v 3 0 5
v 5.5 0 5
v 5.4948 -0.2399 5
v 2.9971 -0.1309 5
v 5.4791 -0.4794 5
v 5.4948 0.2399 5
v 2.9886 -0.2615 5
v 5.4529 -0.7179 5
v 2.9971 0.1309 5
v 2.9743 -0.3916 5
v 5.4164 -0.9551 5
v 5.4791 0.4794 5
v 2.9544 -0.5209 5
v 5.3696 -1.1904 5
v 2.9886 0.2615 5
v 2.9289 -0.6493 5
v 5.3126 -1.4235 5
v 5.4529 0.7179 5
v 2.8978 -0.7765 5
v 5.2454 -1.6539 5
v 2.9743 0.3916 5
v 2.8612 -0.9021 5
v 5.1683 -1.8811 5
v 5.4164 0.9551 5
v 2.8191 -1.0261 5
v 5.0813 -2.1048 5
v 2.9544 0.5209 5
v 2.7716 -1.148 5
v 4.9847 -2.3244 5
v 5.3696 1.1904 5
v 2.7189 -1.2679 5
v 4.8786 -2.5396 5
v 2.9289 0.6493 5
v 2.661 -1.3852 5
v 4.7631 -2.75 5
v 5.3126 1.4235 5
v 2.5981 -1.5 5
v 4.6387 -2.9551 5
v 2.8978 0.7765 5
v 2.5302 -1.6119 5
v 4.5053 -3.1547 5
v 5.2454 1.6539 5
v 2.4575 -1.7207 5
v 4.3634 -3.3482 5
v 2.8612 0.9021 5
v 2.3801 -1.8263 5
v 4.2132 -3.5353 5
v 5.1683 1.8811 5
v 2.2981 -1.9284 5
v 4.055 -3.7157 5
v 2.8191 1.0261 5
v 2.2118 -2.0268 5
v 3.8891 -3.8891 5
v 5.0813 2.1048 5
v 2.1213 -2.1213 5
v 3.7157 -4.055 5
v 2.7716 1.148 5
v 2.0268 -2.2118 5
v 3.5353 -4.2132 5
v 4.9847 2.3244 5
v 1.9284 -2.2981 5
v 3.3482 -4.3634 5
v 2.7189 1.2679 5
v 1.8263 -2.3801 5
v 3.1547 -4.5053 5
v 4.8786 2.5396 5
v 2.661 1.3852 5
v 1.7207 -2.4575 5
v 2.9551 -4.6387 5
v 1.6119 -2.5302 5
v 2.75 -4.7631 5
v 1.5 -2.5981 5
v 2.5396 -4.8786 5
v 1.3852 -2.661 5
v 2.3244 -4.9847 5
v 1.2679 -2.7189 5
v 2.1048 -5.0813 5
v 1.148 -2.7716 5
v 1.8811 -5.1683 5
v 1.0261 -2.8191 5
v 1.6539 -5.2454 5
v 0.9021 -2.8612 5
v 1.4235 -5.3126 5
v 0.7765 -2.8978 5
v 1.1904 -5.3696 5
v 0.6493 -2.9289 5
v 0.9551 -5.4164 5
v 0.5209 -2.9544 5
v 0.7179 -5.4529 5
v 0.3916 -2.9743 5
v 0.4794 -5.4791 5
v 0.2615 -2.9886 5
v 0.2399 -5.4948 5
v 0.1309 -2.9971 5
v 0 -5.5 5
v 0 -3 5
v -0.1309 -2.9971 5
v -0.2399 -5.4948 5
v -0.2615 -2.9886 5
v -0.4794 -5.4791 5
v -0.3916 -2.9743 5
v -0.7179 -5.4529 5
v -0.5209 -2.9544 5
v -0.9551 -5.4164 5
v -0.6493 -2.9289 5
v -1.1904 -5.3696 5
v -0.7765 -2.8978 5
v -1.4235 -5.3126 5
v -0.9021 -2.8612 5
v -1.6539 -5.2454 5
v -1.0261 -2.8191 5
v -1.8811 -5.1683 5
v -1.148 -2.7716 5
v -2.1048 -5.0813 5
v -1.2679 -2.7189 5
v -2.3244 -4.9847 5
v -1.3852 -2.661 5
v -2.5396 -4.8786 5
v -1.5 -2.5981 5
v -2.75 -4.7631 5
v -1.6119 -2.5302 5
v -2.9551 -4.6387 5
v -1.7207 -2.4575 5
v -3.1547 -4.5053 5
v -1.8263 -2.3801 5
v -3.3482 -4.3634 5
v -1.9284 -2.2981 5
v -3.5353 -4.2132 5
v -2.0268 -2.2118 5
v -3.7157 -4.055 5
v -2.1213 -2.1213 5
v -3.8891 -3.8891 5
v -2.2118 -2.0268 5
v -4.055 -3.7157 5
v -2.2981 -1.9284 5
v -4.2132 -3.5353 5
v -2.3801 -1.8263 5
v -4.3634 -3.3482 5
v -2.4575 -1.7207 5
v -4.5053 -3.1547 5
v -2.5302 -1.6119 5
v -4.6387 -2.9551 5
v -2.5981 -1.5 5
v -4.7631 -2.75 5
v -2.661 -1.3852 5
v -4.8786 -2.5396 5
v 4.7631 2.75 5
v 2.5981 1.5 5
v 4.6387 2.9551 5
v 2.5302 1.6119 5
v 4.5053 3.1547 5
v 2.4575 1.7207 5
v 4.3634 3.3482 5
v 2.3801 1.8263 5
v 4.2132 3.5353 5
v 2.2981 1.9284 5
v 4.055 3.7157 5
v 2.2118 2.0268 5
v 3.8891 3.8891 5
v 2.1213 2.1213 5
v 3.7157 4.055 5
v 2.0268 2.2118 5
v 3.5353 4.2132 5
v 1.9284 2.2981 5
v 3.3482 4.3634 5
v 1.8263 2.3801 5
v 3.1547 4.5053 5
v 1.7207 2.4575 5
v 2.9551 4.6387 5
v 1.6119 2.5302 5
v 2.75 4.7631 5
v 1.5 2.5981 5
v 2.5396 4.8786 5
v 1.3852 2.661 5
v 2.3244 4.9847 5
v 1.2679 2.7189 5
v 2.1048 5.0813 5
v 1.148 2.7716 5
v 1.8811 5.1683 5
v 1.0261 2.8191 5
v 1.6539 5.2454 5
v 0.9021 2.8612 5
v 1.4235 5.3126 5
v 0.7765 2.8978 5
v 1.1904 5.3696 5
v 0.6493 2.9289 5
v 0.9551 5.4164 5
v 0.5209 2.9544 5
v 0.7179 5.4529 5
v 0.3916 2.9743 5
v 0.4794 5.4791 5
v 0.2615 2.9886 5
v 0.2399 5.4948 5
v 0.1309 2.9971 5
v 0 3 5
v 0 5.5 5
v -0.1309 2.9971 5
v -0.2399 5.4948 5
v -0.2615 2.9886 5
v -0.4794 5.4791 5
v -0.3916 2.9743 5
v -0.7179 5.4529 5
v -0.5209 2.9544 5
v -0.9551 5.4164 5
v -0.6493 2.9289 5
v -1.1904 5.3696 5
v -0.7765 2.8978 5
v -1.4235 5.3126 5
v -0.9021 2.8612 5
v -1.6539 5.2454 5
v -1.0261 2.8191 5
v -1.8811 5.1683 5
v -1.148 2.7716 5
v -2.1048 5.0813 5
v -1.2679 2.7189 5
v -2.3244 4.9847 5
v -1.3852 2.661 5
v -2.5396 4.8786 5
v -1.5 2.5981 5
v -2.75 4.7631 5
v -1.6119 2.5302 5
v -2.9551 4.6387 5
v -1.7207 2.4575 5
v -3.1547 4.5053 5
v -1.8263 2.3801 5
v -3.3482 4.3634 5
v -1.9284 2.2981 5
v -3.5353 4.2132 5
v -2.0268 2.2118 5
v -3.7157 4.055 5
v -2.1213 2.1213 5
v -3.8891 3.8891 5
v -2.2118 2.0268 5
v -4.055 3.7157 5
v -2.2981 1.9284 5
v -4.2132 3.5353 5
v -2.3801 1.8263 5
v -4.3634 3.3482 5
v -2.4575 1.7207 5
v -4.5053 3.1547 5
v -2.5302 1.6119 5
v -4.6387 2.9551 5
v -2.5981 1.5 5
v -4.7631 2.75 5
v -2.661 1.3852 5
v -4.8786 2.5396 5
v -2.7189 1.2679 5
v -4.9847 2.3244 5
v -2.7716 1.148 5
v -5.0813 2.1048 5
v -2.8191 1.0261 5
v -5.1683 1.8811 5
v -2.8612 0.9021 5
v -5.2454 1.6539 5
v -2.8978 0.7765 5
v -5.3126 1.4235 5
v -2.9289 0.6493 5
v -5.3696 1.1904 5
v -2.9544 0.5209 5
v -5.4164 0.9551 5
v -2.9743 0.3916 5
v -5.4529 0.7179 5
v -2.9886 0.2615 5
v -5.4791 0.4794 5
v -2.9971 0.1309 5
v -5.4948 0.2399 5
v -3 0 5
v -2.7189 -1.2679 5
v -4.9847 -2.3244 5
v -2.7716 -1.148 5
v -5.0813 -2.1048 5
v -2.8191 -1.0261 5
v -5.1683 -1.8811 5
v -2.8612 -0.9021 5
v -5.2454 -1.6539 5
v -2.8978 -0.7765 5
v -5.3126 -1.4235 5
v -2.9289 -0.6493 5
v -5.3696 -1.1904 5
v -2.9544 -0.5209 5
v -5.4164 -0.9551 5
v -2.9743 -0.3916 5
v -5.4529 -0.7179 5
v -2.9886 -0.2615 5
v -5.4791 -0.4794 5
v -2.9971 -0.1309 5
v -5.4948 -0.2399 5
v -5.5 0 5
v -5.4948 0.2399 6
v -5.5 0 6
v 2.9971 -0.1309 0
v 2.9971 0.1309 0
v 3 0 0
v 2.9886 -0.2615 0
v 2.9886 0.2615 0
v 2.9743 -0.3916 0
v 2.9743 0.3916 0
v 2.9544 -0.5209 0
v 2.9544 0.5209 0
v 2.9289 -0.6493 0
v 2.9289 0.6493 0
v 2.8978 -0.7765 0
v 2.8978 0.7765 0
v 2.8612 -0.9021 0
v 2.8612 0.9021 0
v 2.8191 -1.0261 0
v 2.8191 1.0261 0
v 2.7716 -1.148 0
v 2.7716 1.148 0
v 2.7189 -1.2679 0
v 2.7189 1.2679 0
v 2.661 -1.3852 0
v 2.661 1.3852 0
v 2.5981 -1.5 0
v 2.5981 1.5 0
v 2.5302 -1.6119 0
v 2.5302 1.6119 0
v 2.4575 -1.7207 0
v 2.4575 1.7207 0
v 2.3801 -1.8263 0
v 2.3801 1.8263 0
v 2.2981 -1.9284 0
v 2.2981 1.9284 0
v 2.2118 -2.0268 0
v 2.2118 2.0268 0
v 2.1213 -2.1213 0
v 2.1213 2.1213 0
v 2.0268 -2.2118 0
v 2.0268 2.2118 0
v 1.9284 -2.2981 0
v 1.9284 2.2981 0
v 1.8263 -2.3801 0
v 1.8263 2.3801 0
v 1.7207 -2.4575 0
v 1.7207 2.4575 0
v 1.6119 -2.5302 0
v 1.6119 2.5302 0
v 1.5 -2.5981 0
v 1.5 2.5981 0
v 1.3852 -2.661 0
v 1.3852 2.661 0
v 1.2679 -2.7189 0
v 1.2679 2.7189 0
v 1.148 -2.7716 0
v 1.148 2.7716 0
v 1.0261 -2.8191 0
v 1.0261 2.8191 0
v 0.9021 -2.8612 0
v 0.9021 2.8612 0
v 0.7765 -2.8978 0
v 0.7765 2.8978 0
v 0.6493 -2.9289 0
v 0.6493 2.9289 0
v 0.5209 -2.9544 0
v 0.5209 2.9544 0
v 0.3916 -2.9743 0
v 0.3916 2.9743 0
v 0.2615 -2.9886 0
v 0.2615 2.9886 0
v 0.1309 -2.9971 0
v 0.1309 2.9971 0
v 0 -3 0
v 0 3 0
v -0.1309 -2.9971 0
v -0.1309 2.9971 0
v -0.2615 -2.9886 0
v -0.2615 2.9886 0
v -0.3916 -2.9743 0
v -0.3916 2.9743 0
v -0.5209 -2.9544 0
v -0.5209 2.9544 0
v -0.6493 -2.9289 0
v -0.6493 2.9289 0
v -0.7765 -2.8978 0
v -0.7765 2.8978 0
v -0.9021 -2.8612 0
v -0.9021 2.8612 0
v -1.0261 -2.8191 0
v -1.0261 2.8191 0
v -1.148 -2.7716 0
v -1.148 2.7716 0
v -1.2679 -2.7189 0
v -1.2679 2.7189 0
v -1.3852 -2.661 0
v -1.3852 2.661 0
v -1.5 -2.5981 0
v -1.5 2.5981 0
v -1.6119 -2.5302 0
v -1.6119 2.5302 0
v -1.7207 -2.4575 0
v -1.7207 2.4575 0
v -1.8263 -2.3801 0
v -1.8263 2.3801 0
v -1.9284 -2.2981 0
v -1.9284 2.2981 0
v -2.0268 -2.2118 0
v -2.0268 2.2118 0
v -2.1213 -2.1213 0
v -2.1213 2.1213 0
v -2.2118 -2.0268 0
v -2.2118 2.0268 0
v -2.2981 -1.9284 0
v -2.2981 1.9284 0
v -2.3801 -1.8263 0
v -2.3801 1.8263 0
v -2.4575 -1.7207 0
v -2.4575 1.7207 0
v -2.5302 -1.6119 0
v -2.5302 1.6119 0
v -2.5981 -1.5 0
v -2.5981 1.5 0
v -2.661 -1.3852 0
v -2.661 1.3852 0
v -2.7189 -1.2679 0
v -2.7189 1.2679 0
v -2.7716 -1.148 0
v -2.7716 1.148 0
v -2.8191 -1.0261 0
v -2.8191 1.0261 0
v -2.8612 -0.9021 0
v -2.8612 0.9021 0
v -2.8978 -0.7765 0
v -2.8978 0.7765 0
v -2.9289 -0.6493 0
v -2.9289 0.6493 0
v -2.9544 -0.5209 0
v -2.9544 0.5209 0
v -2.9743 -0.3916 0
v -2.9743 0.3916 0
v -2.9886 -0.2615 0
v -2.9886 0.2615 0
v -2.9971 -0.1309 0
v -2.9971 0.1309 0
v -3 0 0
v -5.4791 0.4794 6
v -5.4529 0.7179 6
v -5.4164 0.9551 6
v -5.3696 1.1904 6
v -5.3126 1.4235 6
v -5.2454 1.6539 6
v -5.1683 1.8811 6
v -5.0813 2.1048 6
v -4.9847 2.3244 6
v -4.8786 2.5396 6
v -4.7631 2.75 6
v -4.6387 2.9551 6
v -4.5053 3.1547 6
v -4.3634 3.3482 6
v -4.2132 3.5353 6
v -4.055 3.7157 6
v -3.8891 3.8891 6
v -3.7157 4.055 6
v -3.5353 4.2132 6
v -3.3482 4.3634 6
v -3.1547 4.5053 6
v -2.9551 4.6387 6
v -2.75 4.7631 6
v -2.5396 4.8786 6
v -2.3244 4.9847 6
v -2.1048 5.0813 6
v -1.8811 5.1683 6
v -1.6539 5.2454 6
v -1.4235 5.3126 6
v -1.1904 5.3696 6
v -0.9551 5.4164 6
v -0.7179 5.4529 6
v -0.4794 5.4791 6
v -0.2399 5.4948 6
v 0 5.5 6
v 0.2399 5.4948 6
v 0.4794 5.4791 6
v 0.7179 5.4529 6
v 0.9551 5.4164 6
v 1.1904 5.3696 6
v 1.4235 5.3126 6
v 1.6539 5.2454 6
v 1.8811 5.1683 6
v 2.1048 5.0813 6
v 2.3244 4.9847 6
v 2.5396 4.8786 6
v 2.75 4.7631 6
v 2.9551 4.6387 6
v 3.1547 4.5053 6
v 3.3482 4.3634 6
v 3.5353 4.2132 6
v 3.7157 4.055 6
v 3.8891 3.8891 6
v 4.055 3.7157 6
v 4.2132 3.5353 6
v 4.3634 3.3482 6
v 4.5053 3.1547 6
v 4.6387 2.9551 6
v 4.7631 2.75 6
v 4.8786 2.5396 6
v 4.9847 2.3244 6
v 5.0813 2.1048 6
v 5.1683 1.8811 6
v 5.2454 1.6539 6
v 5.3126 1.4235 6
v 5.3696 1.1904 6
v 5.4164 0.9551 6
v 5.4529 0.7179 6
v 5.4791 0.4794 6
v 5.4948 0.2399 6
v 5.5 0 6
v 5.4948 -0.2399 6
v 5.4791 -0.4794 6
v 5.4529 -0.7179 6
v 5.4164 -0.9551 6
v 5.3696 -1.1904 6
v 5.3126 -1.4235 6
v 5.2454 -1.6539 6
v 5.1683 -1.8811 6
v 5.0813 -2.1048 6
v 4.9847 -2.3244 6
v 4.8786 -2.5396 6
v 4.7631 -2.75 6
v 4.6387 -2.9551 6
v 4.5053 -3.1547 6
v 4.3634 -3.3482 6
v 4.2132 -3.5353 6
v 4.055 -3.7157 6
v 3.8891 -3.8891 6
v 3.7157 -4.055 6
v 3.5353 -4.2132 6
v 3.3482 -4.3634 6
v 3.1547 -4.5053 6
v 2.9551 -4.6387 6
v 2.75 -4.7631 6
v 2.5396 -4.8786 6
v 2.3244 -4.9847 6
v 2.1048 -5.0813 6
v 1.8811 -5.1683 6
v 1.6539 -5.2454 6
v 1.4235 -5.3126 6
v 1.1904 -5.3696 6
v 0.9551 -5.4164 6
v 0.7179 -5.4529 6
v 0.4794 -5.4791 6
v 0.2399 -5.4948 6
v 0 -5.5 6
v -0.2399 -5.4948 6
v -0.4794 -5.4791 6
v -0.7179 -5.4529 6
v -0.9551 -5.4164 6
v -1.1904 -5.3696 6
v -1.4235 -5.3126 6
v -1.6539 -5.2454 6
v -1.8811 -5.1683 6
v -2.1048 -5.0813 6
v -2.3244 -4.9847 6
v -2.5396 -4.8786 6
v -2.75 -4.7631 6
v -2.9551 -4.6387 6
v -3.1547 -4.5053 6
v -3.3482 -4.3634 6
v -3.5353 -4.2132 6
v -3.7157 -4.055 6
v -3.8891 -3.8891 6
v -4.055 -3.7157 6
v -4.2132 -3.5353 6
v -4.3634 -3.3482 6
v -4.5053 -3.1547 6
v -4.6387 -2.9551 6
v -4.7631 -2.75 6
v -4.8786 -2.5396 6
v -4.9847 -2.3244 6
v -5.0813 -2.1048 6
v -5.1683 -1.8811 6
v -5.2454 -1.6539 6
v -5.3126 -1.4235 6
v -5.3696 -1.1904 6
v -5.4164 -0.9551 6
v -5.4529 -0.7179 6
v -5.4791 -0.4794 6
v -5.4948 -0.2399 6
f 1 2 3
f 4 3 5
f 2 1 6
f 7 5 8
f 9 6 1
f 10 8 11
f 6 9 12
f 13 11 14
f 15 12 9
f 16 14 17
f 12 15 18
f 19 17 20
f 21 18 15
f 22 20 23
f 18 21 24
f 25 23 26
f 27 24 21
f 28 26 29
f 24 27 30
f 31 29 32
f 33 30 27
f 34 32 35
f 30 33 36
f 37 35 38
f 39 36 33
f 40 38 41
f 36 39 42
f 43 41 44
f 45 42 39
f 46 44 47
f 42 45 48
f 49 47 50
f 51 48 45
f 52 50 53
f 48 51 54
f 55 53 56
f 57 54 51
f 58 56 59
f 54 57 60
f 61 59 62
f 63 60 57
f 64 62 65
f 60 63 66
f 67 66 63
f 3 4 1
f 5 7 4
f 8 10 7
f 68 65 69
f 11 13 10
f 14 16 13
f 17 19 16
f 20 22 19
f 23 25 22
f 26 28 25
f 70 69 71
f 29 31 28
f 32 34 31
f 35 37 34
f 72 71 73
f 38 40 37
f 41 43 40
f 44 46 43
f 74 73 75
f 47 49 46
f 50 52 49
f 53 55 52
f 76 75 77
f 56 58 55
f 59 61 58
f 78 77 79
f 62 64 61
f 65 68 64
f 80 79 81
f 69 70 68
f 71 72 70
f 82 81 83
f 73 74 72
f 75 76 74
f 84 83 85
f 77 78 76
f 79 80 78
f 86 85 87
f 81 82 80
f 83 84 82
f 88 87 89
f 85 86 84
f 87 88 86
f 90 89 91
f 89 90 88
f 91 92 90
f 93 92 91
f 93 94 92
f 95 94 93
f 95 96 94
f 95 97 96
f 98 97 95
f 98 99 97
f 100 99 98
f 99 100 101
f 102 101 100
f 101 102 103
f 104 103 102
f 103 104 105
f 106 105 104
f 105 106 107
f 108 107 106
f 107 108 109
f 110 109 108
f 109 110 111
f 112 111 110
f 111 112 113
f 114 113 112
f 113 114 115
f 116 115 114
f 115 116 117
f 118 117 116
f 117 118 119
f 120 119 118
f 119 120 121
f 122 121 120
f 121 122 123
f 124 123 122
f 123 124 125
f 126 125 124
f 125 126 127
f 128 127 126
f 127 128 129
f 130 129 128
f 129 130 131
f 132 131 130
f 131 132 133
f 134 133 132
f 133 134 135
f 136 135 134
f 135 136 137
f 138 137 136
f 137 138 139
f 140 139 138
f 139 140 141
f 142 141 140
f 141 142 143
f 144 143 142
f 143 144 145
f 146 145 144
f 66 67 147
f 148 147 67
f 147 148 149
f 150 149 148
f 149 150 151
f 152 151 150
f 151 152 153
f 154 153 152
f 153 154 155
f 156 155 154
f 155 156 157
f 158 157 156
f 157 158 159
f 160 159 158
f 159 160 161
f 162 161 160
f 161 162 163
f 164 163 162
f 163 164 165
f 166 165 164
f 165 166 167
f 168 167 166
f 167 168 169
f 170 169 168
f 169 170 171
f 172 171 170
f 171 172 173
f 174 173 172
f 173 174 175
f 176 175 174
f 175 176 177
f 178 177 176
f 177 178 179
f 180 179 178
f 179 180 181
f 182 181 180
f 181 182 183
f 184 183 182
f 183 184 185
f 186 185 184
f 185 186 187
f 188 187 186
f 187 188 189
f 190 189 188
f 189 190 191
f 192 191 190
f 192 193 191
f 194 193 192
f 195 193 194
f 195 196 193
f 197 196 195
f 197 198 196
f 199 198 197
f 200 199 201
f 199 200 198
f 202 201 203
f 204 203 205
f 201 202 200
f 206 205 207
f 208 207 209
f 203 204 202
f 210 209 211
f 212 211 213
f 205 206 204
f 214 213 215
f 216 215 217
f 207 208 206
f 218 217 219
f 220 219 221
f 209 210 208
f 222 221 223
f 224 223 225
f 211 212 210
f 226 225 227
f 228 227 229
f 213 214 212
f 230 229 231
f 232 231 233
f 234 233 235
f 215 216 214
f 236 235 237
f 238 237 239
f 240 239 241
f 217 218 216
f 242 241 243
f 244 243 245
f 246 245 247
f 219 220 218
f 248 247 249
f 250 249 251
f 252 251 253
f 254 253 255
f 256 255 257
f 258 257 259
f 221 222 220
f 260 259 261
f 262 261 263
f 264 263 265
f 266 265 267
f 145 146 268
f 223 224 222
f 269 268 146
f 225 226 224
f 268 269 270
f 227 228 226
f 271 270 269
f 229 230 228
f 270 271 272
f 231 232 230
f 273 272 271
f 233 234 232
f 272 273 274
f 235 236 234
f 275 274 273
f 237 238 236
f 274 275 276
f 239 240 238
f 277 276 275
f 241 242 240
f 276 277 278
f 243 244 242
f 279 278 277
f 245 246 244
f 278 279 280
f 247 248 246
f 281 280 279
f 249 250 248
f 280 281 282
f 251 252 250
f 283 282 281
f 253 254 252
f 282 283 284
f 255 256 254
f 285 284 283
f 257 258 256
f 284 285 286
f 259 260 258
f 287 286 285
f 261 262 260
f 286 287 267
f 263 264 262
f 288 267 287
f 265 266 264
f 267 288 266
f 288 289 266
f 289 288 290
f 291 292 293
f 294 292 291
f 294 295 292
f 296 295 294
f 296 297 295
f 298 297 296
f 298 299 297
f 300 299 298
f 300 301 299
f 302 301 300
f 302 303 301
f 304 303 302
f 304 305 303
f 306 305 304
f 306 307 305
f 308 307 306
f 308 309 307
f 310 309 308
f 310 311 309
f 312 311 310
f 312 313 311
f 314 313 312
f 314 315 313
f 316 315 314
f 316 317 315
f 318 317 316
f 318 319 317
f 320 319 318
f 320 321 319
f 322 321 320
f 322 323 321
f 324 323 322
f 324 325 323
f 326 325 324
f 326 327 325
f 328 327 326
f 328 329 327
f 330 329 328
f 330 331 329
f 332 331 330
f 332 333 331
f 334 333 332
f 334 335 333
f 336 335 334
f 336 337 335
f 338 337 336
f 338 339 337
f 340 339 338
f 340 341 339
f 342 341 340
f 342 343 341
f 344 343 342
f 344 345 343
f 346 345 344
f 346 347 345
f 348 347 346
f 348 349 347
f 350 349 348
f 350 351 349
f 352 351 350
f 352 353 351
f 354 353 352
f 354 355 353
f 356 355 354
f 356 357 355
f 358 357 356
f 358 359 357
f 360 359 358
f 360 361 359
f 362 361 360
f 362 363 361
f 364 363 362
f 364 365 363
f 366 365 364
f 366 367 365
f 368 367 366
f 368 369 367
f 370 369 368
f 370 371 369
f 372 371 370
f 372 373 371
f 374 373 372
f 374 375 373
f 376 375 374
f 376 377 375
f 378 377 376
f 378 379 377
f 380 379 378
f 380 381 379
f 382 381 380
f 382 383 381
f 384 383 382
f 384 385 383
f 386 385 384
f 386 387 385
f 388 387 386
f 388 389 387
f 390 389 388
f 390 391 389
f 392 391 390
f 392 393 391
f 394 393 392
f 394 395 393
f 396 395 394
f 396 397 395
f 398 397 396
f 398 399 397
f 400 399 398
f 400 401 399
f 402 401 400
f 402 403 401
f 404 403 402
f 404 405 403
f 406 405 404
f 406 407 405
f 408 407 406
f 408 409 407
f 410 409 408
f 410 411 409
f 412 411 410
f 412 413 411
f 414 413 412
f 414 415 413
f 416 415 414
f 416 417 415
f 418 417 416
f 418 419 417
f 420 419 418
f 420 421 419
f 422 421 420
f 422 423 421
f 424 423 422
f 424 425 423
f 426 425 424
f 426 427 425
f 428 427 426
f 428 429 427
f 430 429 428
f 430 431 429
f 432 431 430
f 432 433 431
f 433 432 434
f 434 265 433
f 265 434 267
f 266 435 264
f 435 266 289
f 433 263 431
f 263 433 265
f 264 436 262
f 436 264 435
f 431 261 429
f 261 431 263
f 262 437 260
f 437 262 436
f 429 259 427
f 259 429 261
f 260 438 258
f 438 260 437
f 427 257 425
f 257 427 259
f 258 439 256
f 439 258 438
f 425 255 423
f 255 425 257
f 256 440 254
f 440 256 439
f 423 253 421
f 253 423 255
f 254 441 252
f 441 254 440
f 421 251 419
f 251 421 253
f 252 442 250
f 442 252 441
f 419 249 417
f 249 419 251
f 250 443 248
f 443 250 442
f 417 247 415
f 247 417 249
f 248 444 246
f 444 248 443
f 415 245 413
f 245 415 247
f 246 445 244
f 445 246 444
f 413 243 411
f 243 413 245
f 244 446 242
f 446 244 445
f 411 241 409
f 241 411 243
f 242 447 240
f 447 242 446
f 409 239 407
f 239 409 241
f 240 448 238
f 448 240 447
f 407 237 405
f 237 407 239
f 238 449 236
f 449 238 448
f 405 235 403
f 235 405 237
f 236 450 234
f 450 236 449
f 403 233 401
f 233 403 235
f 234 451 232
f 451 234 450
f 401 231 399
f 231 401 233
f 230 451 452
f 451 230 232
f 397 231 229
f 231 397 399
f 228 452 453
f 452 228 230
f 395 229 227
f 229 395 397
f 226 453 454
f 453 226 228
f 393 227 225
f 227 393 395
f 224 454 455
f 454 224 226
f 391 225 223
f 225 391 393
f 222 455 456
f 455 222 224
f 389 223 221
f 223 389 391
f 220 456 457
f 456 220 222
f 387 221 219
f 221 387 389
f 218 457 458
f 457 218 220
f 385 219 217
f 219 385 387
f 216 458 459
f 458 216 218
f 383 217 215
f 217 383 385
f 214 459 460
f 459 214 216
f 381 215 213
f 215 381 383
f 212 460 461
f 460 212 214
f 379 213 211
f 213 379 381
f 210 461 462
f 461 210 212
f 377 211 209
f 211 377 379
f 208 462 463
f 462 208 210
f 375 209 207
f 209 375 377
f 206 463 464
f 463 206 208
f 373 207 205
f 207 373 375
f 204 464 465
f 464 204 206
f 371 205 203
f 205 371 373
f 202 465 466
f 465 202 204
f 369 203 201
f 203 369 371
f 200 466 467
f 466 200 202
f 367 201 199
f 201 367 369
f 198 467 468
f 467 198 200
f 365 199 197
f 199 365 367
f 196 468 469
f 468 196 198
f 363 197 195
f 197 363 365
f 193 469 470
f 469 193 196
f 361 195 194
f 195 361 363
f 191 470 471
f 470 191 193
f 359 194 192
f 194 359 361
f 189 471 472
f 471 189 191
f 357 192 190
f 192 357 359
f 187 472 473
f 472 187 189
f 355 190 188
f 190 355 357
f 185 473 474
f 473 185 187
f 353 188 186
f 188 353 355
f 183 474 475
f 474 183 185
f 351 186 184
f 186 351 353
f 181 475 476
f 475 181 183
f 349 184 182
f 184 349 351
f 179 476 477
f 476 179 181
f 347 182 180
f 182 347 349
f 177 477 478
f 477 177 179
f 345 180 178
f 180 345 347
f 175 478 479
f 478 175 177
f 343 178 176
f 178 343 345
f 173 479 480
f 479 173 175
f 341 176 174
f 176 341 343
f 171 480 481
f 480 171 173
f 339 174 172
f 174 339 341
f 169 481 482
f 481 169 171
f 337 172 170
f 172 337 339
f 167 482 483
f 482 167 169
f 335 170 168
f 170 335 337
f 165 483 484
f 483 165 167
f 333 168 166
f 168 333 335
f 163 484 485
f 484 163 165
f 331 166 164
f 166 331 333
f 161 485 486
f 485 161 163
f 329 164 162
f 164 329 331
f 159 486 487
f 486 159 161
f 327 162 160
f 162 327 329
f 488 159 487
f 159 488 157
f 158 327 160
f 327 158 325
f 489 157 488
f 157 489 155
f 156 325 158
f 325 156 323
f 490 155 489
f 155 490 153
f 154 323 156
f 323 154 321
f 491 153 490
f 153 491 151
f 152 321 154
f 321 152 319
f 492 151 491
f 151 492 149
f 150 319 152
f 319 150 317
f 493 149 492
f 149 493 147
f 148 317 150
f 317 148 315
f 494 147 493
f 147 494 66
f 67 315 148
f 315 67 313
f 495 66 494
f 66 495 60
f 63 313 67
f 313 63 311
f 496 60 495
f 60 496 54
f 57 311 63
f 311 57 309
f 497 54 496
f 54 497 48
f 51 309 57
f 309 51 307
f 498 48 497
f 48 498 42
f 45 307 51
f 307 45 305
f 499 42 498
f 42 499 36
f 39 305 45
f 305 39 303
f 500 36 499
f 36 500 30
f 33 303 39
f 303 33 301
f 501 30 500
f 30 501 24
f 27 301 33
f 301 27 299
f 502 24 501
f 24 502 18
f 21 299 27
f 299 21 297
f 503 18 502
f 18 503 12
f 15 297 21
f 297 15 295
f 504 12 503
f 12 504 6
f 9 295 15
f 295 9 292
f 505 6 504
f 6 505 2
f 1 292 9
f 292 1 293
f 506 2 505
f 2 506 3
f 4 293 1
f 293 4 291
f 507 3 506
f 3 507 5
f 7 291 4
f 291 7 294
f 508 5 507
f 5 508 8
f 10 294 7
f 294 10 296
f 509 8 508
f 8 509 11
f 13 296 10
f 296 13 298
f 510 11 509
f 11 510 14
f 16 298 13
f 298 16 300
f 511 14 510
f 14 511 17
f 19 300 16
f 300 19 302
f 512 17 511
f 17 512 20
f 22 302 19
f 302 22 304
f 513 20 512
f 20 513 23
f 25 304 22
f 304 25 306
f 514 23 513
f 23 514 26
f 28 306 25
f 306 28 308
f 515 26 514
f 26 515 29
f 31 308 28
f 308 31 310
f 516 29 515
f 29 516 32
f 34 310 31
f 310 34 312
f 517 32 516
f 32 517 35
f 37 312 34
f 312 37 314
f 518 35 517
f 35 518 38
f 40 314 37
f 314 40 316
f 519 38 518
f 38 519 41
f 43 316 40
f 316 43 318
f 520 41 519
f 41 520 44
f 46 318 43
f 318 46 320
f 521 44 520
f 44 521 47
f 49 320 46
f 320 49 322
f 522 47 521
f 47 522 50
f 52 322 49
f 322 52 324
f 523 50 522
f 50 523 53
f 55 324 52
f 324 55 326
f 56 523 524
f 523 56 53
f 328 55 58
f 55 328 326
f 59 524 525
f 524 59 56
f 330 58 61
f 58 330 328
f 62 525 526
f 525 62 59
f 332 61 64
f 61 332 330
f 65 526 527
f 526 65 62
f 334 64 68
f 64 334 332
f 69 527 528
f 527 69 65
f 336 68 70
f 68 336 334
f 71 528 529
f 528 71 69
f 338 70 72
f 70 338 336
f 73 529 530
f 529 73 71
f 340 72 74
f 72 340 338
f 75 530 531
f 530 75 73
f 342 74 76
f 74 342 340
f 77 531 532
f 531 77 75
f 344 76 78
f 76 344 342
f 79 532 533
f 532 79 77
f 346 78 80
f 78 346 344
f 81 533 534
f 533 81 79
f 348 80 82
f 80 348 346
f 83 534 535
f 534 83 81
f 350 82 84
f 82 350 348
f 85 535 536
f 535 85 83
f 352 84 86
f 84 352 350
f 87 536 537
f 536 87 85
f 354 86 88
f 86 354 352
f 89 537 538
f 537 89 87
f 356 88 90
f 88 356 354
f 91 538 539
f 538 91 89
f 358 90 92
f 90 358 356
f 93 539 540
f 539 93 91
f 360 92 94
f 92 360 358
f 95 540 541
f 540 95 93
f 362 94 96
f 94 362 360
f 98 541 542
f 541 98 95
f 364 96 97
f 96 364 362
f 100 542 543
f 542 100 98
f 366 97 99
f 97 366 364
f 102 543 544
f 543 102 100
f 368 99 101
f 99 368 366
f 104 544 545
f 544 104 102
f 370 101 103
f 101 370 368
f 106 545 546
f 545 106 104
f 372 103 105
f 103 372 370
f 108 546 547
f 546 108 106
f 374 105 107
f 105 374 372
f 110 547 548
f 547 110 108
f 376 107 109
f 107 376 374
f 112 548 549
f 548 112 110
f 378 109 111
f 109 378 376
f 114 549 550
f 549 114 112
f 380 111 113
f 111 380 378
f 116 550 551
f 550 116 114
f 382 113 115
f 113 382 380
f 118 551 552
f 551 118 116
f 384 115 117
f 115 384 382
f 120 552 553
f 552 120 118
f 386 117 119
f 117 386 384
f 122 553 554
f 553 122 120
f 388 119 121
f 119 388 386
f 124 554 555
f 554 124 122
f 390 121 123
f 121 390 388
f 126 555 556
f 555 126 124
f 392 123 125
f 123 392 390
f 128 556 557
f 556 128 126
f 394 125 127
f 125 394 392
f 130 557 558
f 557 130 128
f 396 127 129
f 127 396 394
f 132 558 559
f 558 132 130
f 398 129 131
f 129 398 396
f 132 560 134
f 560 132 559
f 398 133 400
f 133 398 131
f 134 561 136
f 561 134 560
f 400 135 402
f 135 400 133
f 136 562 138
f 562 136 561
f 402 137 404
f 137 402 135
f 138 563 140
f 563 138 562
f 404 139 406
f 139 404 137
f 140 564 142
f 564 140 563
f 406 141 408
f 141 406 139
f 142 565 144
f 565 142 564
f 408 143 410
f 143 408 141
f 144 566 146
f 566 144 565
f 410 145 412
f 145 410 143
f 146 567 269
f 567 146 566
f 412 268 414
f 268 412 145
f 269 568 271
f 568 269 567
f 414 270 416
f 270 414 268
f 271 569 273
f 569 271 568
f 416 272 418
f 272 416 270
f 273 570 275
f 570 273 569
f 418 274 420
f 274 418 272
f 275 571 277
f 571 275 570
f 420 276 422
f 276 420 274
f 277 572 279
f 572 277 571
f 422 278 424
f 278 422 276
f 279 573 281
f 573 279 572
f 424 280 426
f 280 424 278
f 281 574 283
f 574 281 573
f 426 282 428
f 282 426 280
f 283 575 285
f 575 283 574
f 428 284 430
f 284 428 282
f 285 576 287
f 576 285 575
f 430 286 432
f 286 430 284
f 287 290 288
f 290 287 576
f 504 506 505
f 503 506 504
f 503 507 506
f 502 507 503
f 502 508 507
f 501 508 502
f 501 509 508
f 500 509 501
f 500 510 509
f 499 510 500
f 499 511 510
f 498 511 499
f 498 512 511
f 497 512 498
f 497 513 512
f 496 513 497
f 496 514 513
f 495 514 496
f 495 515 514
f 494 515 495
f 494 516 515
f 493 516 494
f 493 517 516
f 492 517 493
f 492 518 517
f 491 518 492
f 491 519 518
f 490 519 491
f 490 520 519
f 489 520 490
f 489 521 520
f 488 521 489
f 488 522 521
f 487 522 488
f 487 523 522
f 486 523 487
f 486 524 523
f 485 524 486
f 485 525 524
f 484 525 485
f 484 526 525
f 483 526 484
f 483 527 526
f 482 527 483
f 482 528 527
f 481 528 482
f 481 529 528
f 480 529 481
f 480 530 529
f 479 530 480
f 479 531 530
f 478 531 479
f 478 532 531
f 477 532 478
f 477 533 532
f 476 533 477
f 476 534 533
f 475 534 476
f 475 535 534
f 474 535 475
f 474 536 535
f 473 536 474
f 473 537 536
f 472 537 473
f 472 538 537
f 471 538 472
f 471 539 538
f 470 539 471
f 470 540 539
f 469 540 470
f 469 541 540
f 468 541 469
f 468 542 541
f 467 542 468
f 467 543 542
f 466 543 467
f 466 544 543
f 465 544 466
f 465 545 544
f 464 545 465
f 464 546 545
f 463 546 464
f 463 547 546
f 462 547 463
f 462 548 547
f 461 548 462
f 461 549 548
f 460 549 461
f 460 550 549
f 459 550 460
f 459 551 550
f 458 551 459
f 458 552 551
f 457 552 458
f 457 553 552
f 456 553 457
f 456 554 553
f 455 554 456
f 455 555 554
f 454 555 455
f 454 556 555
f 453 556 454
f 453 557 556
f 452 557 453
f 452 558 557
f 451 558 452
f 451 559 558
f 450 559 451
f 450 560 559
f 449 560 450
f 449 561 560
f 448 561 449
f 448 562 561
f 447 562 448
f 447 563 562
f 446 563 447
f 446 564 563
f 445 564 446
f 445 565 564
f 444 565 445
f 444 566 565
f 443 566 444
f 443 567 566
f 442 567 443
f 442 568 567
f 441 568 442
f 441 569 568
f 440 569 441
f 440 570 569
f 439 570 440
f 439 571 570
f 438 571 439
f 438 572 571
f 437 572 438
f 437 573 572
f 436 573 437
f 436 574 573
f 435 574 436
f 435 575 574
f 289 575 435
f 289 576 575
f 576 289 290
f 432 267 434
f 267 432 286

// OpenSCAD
// file: belt_director.scad
// The Belt Director: a shouldered sleeve, shared by the two lengths of it, and the cap that presses in
// behind it.
//
//     210-004_SmallBeltDirector.scad   S1 17.000 long, revised 16.700
//     210-005_LargeBeltDirector.scad   S1 27.000 long, revised 26.000
//     210-001_BeltDirectorCap.scad     the cap, for either
//
// Two MR128s press onto S1, whose Ø8.000 is their bore, so their Ø12 outer races carry the belt; the
// directors push through the Arm Body's lug columns front to back and a cap presses in behind
// (specs/008.5 step 7). Measured from both references with scadmesh profile/slice/radial; they agree
// to 0.002, and their only difference is S1's length. The feature IDs are those of each part's
// .view.json:
//
//     ID  feature   value                       z span
//     H1  head      Ø11.000, solid              -0.500 .. 0
//     S1  shank     Ø8.000                      0 .. length
//     B1  core      Ø4.700, blind to H1         0 .. length
//
// The z rows a histogram reports along S1 (5.667, 11.333 on the Small; 5.4, 6.75, ... on the Large)
// are tessellation rows, not faces. FRAME: the axis on +Z through the origin, H1's top at z = 0.
//
// THE DISCS. The head bears on the bearing at the front and the cap's disc on the one at the back, and a
// disc that reaches the outer race brakes the bearing it locates, since the outer race is the one that
// turns with the belt. `revised` therefore draws both discs at DISC_D, one diameter, between S1's Ø8 and
// the Ø10 halfway line across the MR128's section (700-Differential/diff_params.scad, shoulder_bore), so
// each touches the inner race alone and clears the outer race, DISC_T thick for strength, with the outer
// face's edge rounded DISC_FILLET to be comfortable to handle. The bearing-side edge stays sharp: a round
// there would take the flat the inner race bears on. `previous` keeps the reference head's Ø11 x 0.5.
//
// THE CAP. A solid plug of the core's bore at the press clearance (print_fit.scad), CAP_PLUG long, under a
// disc of the head's size. FRAME: the disc's underside at z = 0, the plug below it. The cap's disc sits on
// the inner race of the bearing behind the shank: `revised` S1 is the span between a column's outer bearings
// (the Arm Body draws B and C 16.7 apart, A 26.0), so it ends flush with the bearing behind it and the disc bears
// on the race and the shank both. S1's `previous` length is the reference's.
//
// FITS (print_fit.scad), revised only: S1 on the MR128's Ø8 bore at the press clearance, and the cap's plug
// in B1 at the press clearance too: both are printed, which is the slip class, but the plug is a press fit by
// design, and a slip gap would let it fall out. S1 in the Arm Body's Ø9 holes is settled there.
//
// Used, not included: each part file calls belt_director(length) or belt_director_cap(), and the Idler
// Plug solid_revolve().

include <../print_fit.scad>

BELT_DIRECTOR_HEAD  = [5.500, 0.500];   // previous: radius, thickness
BELT_DIRECTOR_SHANK = 4.000;            // radius
BELT_DIRECTOR_CORE  = 2.350;            // radius
DISC_D              = 9.500;            // revised: both discs
DISC_T              = 2.000;            // revised: both discs' thickness
DISC_FILLET         = 1.000;            // revised: the round on each disc's outer edge
CAP_PLUG            = 5.000;            // the plug's length: past the bearing's 3.5

// The quarter circle of radius r about c, from angle a0 to a1.
function quarter(c, r, a0, a1, n = 12) = [for (i = [0 : n]) c + r * [cos(a0 + (a1 - a0) * i / n), sin(a0 + (a1 - a0) * i / n)]];

// The solid of revolution of an [r, z] profile with an edge on the axis, clipped to a box 1 mm clear of
// it so that the export carries no zero-area facets along the axis (README.md, "A revolve with an edge
// on the axis"). The Idler Plug uses it too.
module solid_revolve(profile)
    let(r = max([for (p = profile) p.x]) + 1, z0 = min([for (p = profile) p.y]) - 1, z1 = max([for (p = profile) p.y]) + 1)
    intersection() {
        rotate_extrude() polygon(profile);
        translate([-r, -r, z0]) cube([2 * r, 2 * r, z1 - z0]);
    }

module belt_director(length, cfg = "previous")
    let(t = cfg == "previous" ? BELT_DIRECTOR_HEAD[1] : DISC_T,
        r = cfg == "previous" ? BELT_DIRECTOR_HEAD[0] : DISC_D / 2,
        s = cfg == "previous" ? BELT_DIRECTOR_SHANK : fit_pin(2 * BELT_DIRECTOR_SHANK, fit_clearances(cfg)[1]) / 2,
        f = cfg == "previous" ? 0 : DISC_FILLET)
    solid_revolve(concat(
        [[0, -t]],
        f > 0 ? quarter([r - f, -t + f], f, -90, 0) : [[r, -t]],
        [[r, 0], [s, 0], [s, length], [BELT_DIRECTOR_CORE, length], [BELT_DIRECTOR_CORE, 0], [0, 0]]));

module belt_director_cap(cfg = "revised")
    let(p = fit_pin(2 * BELT_DIRECTOR_CORE, fit_clearances(cfg)[1]) / 2, r = DISC_D / 2, f = DISC_FILLET)
    solid_revolve(concat(
        [[0, -CAP_PLUG], [p, -CAP_PLUG], [p, 0], [r, 0]],
        quarter([r - f, DISC_T - f], f, 0, 90),
        [[0, DISC_T]]));
// file: ../print_fit.scad
// Print-fit clearances, shared by every printed part's `config="revised"`.
//
// A printed part comes off the machine slightly oversize, so a feature drawn
// line-to-line against what it mates with will not go together. Each mating
// feature is drawn at its mate's nominal size plus or minus one of two
// clearances, per side, chosen by what the mate is:
//
//     FIT_PRESS    a bought part the printed one is seated on, located by
//                  or bonded to: bearings, motors, splines, CF rods, tubes
//                  and strakes
//     FIT_SLIP     another printed part, and every fastener's clearance:
//                  screw holes, nut traps and pockets
//
// A third class is not a fit, because its surfaces never meet:
//
//     FIT_RUN      a gap between two parts that turn past each other and
//                  must never touch, such as a housing and a gear's teeth
//
// A fourth class is drawn under its mate's size, not over it:
//
//     FIT_TAP      a pilot a screw cuts its own thread into, drawn as
//                  fit_pin(the screw's nominal, FIT_TAP)
//
// The classes, their members and exclusions, and how a machine is qualified
// against these values are owned by specs/007.2 § Print fits; the coupon that
// qualifies them is 950-Tooling/fit_coupon.scad.
//
// Every part `include`s this file, so `-D FIT_SLIP=...` reaches a single
// render, and an edit here retunes every part. `config="previous"` draws at
// zero clearance: it is the reference mesh, and its dist gate measures it.

FIT_SLIP  = 0.15;
FIT_PRESS = 0.05;
FIT_RUN   = 0.50;
FIT_TAP   = 0.20;

// A hole or bore that takes a mate of diameter d, and a pin or shaft that
// goes into one, with clearance c per side.
function fit_bore(d, c) = d + 2 * c;
function fit_pin(d, c) = d - 2 * c;

// The clearances a part draws in configuration cfg: [slip, press, run, tap].
function fit_clearances(cfg) =
    cfg == "previous" ? [0, 0, 0, 0] : [FIT_SLIP, FIT_PRESS, FIT_RUN, FIT_TAP];
// main file
// #210-003 Idler Plug — parametric source.
// The plug the Belt Director Pulley's bearing turns on. It passes through both plates of the Arm Body's D
// column and the pulley's MR85 between them, its head on the upper plate, and an M2 x 20 bolt through its
// bore carries the nut at the lower plate's face (specs/008.5 steps 8-10). The Belt Director Caps
// (#210-001) are a separate part, belt_director.scad's.
//
//   config = "previous" — a faithful recreation of the reference mesh
//                         (../Reference/meshes/200-ArmBody/210-001_IdlerPlug.stl), in that mesh's frame.
//   config = "revised"  — the plug the D column's through hole takes (200-001_ArmBody.scad): a tube of the
//                         column's whole depth, bored for the bolt.
//
// FRAME. The reference's own: the axis on +Z through the origin, the shank's end at z = 0.
//
// Measured from the reference with scadmesh profile/radial/planes. The feature IDs are those of
// 210-003_IdlerPlug.view.json:
//
//     ID  feature   value     z span
//     S1  shank     Ø6.000    0 .. 5, solid
//     H1  head      Ø11.000   5 .. 6
//
// REVISED. The reference's Ø6 shank is neither the MR85's Ø5 bore nor the upper plate's Ø5 hole, and its
// 5 mm stops short of the upper plate. `revised` is the part that fits both:
//
//     ID  feature   value                                  z span
//     S1  tube      Ø4.900, the MR85's Ø5 bore at the      0 .. TUBE
//                   press clearance
//     H1  head      Ø11.000, outer edge R1                 TUBE .. TUBE + 2
//     B1  bolt bore Ø2.300, the M2 at the slip clearance   through
//
// TUBE is the D column's depth, z 55.650 .. 70.250, so the tube's end is flush with the lower plate's
// face when the head is on the upper plate's. The tube is Ø4.9 in the Arm Body's Ø5.2 holes
// (200-001_ArmBody.scad, plug_hole_r), the slip clearance to it. The head is as thick as the Belt Director discs, with its outer edge rounded.

include <../print_fit.scad>
use <belt_director.scad>   // solid_revolve()

/* [Configuration] */
// Parameter set: previous (reference) or revised
config = "previous"; // [previous, revised]

/* [Hidden] */
$fn = 144;

SHANK = [3.000, 5.000];    // radius, top
HEAD  = [5.500, 6.000];    // radius, top

MR85_BORE = 5.000;
BOLT_D    = 2.000;         // M2
TUBE      = 14.600;        // revised: z 55.650 .. 70.250 of the Arm Body
HEAD_T    = 2.000;         // revised: as the Belt Director discs
HEAD_R    = 1.000;         // revised: the round on the head's outer edge

module idler_plug_previous()
    solid_revolve([[0, 0], [SHANK[0], 0], [SHANK[0], SHANK[1]],
                   [HEAD[0], SHANK[1]], [HEAD[0], HEAD[1]], [0, HEAD[1]]]);

module idler_plug_revised()
    let(c = fit_clearances("revised"), r = fit_pin(MR85_BORE, c[1]) / 2, bore = fit_bore(BOLT_D, c[0]) / 2)
    rotate_extrude() polygon(concat(
        [[bore, 0], [r, 0], [r, TUBE], [HEAD[0], TUBE]],
        [for (i = [0 : 12]) let(a = 90 * i / 12) [HEAD[0] - HEAD_R + HEAD_R * cos(a), TUBE + HEAD_T - HEAD_R + HEAD_R * sin(a)]],
        [[bore, TUBE + HEAD_T]]));

module idler_plug(cfg = config)
    if (cfg == "previous") idler_plug_previous(); else idler_plug_revised();

idler_plug();
